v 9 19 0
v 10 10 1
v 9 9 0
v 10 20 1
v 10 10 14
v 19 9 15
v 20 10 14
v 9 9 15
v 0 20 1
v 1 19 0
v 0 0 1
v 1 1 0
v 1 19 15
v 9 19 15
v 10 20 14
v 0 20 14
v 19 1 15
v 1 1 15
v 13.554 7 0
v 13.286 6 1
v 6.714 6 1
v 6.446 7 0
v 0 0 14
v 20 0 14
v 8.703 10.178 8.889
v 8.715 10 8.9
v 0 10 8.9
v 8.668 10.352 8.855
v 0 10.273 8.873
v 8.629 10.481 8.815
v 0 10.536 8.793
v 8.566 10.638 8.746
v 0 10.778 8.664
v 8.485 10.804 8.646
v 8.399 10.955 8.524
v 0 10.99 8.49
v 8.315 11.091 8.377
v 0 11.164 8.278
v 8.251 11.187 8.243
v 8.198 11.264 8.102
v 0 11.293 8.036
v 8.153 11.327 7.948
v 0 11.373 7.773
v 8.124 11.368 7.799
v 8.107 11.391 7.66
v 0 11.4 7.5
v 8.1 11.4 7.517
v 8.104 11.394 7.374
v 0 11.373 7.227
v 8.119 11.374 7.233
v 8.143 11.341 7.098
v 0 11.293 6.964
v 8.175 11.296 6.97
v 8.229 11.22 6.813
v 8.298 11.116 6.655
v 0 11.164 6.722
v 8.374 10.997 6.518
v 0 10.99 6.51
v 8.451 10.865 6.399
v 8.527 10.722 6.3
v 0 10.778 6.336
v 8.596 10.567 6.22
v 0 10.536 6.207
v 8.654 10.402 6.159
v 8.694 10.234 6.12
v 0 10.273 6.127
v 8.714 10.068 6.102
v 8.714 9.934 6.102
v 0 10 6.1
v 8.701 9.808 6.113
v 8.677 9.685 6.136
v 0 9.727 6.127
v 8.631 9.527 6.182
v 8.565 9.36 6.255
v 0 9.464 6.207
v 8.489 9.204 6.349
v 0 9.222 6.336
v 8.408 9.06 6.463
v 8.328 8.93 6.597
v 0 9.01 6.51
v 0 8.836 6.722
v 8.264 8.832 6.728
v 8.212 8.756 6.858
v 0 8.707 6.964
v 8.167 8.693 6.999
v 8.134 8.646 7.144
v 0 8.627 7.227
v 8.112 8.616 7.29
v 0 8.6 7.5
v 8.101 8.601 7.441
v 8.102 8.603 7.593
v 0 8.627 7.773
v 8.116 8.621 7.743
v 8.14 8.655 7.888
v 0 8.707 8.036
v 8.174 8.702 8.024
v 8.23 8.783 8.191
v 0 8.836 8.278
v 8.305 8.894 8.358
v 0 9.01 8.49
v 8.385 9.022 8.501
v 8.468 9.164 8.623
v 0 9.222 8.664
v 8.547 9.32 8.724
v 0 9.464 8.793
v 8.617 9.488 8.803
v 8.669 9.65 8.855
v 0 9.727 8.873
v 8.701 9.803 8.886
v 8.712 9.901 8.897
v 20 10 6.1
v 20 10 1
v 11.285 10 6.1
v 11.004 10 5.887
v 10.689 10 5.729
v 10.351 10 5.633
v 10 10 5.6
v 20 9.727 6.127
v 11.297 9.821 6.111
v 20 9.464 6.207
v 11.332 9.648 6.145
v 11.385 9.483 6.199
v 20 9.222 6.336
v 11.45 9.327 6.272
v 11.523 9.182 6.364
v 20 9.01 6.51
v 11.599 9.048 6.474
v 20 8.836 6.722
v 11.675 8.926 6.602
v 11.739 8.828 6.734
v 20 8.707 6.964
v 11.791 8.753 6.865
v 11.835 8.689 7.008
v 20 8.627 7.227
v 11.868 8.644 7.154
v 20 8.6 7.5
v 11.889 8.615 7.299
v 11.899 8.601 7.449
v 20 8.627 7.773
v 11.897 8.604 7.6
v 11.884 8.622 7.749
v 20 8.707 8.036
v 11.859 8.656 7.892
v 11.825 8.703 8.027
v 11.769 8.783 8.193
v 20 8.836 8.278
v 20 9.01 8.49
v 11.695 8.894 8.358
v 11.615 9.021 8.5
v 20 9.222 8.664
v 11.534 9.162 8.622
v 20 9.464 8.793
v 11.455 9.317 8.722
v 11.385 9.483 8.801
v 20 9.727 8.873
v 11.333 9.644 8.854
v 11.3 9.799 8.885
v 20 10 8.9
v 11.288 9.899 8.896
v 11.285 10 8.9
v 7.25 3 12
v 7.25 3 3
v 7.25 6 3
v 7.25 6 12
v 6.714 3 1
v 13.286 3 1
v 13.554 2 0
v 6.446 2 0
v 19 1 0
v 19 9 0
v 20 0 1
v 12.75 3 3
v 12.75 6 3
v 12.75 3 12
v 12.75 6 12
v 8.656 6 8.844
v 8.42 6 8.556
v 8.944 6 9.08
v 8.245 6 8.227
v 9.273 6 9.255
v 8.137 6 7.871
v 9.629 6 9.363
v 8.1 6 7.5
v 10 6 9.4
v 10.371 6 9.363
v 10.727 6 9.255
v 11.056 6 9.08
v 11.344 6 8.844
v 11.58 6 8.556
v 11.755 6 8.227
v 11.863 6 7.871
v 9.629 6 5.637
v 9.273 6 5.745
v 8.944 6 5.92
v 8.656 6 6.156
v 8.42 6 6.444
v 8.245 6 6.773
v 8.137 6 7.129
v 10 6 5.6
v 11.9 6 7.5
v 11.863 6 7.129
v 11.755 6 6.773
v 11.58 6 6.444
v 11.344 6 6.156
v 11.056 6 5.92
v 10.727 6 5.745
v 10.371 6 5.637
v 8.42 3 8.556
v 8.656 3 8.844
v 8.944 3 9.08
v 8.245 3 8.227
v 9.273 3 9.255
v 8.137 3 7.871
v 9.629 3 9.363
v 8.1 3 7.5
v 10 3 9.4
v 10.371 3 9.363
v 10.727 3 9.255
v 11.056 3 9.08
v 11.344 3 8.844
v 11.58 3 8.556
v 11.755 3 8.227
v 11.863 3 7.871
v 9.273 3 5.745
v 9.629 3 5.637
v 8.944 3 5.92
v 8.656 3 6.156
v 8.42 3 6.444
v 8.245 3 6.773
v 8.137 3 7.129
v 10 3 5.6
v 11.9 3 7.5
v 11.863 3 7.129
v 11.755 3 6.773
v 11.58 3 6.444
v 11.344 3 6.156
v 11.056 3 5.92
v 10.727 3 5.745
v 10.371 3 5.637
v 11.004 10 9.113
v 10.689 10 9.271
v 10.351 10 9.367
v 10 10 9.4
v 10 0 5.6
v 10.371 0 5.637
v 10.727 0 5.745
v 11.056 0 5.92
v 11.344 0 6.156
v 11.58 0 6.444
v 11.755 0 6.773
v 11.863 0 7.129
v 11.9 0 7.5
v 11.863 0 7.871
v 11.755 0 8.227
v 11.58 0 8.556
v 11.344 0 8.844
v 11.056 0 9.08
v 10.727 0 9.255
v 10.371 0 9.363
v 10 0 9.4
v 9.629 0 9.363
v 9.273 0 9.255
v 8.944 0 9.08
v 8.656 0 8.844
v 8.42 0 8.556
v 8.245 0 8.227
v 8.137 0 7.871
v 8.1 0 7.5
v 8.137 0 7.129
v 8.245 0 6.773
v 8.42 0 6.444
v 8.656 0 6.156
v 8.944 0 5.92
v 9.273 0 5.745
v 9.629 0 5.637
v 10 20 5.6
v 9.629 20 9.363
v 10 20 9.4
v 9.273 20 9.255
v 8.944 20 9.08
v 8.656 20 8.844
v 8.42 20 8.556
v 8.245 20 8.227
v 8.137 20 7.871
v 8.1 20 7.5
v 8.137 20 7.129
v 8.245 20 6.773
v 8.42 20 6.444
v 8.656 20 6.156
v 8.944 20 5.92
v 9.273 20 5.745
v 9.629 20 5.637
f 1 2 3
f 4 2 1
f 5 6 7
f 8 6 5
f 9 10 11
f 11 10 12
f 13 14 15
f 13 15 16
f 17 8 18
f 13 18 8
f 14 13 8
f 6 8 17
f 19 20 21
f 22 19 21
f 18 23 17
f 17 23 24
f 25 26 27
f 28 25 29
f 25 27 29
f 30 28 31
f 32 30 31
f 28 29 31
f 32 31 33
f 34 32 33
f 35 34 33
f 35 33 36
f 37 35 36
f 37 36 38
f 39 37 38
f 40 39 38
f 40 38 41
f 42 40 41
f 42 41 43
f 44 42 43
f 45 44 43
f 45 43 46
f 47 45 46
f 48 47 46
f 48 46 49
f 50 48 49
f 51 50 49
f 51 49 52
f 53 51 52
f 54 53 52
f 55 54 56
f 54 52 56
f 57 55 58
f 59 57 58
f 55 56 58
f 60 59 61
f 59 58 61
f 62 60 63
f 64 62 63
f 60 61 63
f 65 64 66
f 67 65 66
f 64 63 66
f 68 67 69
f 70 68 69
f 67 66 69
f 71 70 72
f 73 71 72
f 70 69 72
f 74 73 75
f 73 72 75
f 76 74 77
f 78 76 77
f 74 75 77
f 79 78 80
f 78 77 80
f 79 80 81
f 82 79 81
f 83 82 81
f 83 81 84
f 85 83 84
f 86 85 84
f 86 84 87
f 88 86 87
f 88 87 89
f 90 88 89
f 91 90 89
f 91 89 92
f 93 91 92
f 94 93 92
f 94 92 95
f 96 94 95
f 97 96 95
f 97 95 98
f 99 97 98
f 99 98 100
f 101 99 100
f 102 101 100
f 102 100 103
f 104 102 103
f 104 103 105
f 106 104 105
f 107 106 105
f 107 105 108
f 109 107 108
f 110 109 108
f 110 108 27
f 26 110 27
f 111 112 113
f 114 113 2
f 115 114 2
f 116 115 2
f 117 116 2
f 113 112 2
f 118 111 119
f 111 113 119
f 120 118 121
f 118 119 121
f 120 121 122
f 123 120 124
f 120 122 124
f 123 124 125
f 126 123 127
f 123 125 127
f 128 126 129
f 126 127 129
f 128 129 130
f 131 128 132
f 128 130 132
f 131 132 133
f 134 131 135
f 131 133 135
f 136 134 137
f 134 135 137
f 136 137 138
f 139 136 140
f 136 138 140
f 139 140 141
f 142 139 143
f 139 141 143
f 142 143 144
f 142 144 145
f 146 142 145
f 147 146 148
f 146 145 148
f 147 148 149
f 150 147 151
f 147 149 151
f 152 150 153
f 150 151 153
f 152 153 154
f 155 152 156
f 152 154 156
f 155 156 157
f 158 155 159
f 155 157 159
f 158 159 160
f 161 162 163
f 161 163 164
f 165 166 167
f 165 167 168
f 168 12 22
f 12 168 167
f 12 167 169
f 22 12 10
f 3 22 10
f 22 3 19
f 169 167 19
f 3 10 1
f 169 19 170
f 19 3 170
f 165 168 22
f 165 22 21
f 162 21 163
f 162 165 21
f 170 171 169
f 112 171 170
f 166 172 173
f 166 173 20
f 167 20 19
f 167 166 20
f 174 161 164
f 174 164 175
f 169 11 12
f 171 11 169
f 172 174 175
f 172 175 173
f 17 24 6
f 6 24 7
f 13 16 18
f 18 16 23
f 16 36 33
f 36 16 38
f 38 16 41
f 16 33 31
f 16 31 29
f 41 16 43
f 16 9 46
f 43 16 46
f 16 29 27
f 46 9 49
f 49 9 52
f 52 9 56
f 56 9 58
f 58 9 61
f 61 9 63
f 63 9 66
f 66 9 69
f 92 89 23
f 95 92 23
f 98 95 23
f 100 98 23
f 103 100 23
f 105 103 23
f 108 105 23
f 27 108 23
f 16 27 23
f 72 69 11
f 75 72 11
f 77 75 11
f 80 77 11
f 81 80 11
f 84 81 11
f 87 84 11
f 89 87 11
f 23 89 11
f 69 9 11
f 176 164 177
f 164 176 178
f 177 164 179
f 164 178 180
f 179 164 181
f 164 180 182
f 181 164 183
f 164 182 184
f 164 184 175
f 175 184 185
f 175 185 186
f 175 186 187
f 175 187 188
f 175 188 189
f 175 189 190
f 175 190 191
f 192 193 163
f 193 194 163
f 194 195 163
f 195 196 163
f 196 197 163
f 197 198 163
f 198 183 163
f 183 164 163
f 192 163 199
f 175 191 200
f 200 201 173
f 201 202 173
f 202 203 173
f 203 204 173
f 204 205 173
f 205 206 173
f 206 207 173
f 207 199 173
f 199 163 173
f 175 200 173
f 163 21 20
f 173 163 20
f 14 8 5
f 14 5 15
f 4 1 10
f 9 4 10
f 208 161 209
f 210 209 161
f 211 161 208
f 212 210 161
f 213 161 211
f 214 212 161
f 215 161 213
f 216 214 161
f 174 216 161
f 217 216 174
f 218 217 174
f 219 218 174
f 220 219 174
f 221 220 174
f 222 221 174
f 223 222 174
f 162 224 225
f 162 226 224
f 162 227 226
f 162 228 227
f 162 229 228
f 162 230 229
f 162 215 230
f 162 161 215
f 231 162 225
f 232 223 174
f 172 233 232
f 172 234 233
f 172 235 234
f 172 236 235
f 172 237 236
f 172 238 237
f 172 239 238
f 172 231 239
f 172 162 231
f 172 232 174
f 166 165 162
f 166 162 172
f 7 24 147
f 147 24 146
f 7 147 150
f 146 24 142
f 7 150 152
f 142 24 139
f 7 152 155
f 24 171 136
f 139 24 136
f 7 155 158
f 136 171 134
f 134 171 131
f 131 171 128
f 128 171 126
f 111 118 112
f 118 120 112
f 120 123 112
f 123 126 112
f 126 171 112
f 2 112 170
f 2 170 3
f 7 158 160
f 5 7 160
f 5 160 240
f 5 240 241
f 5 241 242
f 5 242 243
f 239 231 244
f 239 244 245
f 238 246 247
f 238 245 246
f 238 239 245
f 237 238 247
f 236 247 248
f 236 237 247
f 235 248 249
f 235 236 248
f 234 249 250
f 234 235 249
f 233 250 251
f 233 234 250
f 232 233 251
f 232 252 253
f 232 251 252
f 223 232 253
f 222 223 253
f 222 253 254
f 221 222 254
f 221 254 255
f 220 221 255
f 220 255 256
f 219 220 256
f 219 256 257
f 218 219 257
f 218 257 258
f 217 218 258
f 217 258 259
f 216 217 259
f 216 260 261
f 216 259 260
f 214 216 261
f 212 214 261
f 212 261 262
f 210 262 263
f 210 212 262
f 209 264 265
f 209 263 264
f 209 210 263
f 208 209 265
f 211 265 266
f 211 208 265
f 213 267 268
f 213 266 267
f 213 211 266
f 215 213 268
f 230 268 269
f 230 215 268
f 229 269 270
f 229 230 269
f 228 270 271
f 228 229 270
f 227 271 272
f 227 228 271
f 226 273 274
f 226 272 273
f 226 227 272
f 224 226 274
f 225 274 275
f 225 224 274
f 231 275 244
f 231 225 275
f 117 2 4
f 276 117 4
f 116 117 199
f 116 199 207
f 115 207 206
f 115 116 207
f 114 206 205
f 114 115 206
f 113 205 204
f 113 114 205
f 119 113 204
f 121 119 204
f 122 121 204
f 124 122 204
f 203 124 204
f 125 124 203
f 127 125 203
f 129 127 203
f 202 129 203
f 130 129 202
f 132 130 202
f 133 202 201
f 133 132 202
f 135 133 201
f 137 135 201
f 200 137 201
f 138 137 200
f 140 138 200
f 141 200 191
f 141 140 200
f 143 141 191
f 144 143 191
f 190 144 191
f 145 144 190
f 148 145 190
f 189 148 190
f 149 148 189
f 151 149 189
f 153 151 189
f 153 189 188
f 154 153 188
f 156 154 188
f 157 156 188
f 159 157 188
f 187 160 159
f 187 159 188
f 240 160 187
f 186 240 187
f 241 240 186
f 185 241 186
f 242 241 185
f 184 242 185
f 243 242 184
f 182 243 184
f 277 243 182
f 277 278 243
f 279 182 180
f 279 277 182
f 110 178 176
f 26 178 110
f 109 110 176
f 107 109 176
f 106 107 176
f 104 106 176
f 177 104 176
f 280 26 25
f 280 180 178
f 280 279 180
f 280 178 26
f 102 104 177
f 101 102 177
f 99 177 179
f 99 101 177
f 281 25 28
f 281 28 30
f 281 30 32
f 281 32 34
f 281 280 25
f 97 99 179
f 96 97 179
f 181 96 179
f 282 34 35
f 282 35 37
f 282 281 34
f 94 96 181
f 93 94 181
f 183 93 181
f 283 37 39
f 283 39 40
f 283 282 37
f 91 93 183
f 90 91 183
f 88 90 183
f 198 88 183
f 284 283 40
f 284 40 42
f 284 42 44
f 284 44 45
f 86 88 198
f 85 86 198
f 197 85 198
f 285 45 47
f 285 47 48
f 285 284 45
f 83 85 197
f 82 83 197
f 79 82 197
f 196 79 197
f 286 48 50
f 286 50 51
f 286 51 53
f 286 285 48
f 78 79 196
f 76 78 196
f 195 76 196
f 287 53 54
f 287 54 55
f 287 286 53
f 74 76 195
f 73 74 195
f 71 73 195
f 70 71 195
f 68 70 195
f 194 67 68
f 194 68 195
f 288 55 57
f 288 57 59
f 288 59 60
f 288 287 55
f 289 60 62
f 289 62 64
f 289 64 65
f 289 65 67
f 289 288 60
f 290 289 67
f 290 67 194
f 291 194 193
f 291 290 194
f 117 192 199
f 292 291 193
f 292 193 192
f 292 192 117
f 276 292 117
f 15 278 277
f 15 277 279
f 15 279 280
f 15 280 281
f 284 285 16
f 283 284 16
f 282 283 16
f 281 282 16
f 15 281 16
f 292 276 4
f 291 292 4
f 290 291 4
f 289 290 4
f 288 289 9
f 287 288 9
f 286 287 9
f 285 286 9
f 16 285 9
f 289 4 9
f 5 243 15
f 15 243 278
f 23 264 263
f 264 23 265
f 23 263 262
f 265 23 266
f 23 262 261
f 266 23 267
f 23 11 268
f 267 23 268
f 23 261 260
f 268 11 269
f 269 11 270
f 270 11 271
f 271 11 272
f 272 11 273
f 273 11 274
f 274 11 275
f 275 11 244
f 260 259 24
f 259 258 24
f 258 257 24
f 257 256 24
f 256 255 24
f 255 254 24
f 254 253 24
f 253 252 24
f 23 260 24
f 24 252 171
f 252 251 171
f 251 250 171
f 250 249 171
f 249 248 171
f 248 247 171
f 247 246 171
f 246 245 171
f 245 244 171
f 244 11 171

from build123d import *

# Parameters (mm, degrees)
BOSS_EXTRUDE2_DEPTH     = 15
SKETCH3_R               = 1.4
CUT_EXTRUDE1_DEPTH      = 33.015621187
CUT_EXTRUDE2_DEPTH      = 31.232432916
CUT_EXTRUDE2_DEPTH_BACK = 31.232432916
SKETCH4_R               = 1.9
CUT_EXTRUDE3_DEPTH      = 3
CHAMFER1_SIZE           = 1
CHAMFER2_SIZE           = 1
CHAMFER5_SIZE           = 1


with BuildPart() as part:
    # Sketch2 → Boss-Extrude2 (new body)
    with BuildSketch(Plane.XY):
        Polygon((0, 20), (0, 0), (20, 0), (20, 10), (10, 10), (10, 20), align=None)
    extrude(amount=BOSS_EXTRUDE2_DEPTH)

    # Sketch3 → Cut-Extrude1 (cut, through all)
    with BuildSketch(Plane.ZY):
        with Locations((7.5, 10)):
            Circle(SKETCH3_R)
    extrude(amount=-CUT_EXTRUDE1_DEPTH, mode=Mode.SUBTRACT)

    # Sketch4 → Cut-Extrude2 (cut, two sides: drawn at the far end of the back side and taken through both)
    with BuildSketch(Plane(origin=(0, 3, 0), x_dir=(-1, 0, 0), z_dir=(0, -1, 0)).offset(-CUT_EXTRUDE2_DEPTH_BACK)):
        with Locations(Location((-10, -7.5, 0), (0, 0, 90))):
            Circle(SKETCH4_R)
    extrude(amount=CUT_EXTRUDE2_DEPTH + CUT_EXTRUDE2_DEPTH_BACK, mode=Mode.SUBTRACT)

    # Sketch5 → Cut-Extrude3 (cut)
    with BuildSketch(Plane(origin=(0, 3, 0), x_dir=(-1, 0, 0), z_dir=(0, -1, 0))):
        Polygon((-12.75, -3), (-13.553847577, 0), (-6.446152423, 0), (-7.25, -3), (-7.25, -12), (-12.75, -12), align=None)
    extrude(amount=-CUT_EXTRUDE3_DEPTH, mode=Mode.SUBTRACT)

    # Chamfer1
    chamfer1_edges = [part.edges().sort_by_distance(p)[0] for p in [
        (10, 3, 0),
        (10, 6, 0),
    ]]
    chamfer(chamfer1_edges, length=CHAMFER1_SIZE)

    # Chamfer2
    chamfer2_edges = [part.edges().sort_by_distance(p)[0] for p in [
        (10, 0, 15),
        (20, 5, 15),
        (15, 10, 15),
        (10, 15, 15),
        (5, 20, 15),
        (0, 10, 15),
    ]]
    chamfer(chamfer2_edges, length=CHAMFER2_SIZE)

    # Chamfer5
    chamfer5_edges = [part.edges().sort_by_distance(p)[0] for p in [
        (10, 15, 0),
        (15, 10, 0),
        (20, 5, 0),
        (10, 0, 0),
        (0, 10, 0),
        (5, 20, 0),
    ]]
    chamfer(chamfer5_edges, length=CHAMFER5_SIZE)


solid = part.part
